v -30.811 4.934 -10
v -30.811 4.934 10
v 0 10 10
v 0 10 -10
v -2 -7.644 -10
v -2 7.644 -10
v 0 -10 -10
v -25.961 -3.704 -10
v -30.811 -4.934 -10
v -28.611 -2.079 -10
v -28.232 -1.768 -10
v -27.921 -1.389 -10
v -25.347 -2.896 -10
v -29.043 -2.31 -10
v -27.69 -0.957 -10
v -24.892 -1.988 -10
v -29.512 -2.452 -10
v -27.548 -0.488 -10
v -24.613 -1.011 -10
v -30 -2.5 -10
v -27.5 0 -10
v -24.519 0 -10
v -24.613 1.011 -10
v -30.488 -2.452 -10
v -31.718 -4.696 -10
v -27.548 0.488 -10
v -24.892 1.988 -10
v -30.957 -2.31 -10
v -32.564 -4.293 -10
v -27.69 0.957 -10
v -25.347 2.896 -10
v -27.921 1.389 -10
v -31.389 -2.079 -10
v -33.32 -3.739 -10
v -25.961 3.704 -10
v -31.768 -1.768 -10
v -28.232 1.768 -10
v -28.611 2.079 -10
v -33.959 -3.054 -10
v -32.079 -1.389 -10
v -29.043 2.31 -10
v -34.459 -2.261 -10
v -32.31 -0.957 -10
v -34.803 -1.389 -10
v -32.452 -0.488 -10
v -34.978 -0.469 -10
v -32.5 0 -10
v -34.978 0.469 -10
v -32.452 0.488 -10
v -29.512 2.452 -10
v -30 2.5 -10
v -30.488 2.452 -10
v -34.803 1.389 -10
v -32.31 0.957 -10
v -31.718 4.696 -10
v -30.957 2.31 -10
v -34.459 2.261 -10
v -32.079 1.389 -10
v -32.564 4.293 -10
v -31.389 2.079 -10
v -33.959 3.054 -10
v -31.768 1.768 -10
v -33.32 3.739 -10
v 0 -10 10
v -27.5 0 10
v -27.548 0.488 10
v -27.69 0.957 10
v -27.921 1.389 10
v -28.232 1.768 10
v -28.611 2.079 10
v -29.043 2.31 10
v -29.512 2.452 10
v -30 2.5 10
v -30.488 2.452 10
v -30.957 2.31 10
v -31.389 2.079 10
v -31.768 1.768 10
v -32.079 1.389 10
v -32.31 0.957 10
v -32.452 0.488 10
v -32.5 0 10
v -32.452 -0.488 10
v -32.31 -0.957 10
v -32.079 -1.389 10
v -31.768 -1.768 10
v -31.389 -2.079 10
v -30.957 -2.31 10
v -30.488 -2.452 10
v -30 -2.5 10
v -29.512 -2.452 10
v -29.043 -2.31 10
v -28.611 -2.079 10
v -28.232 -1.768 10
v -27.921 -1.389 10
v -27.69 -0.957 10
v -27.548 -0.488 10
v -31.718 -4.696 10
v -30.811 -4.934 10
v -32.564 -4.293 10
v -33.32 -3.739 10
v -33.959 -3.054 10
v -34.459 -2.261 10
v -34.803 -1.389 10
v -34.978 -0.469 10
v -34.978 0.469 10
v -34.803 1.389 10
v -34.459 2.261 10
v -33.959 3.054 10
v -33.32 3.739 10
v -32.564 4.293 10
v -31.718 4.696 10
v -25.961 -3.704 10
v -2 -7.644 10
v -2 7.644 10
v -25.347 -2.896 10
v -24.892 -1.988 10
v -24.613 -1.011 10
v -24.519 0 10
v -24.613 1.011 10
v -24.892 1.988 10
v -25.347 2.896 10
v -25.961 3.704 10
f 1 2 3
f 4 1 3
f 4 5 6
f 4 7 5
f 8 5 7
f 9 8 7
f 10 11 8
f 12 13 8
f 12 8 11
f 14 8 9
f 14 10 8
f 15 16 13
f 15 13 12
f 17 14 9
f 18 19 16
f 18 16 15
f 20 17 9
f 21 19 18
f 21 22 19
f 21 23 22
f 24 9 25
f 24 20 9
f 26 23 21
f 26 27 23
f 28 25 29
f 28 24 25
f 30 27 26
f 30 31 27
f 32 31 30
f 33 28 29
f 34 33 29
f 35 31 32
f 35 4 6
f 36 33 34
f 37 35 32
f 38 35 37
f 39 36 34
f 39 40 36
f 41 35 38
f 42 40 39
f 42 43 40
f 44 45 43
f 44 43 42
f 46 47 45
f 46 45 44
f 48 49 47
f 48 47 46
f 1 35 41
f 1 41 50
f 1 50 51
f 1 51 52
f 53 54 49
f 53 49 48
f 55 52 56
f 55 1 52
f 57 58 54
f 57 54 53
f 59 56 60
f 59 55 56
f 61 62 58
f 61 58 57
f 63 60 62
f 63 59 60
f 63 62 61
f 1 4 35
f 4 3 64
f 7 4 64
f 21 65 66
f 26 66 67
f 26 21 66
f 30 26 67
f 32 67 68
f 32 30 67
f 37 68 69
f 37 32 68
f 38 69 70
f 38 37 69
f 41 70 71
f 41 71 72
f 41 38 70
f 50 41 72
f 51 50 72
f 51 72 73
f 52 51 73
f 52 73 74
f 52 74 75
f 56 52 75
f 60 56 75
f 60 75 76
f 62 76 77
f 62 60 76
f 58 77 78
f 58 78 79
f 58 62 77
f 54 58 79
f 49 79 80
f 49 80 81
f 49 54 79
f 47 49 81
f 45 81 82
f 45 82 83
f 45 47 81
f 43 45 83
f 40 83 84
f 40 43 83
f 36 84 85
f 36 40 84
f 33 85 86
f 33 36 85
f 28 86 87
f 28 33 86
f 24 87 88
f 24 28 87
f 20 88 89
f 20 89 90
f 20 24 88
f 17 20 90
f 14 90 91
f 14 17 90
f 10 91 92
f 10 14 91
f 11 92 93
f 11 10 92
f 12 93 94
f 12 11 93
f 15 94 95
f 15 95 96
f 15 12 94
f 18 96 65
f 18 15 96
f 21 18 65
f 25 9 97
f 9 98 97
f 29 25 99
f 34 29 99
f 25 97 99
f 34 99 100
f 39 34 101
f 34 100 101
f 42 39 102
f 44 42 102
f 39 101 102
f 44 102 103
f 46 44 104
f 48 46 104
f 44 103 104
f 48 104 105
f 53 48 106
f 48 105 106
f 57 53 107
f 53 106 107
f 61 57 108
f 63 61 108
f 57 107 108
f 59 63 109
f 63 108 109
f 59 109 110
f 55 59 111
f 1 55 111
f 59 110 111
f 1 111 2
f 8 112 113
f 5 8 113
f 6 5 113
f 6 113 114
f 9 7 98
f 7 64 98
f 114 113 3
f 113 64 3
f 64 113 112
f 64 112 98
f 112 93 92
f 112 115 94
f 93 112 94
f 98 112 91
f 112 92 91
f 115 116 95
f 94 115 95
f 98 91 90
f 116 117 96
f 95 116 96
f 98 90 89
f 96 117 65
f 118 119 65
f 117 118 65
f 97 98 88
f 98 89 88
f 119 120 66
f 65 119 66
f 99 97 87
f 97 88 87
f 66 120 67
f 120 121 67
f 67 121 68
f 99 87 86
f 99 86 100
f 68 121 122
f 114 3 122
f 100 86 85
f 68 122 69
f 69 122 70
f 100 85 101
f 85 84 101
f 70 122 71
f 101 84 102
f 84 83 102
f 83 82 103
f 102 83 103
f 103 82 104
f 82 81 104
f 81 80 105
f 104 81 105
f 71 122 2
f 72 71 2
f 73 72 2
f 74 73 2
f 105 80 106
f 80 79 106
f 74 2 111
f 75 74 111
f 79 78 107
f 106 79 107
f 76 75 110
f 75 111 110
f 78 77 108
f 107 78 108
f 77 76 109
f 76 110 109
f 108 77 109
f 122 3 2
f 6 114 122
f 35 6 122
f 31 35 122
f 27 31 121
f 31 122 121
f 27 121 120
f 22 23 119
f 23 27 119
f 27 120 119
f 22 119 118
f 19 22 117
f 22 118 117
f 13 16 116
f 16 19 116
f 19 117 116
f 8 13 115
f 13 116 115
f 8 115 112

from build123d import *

# Parameters (mm, degrees)
SKETCH_1_R          = 2.5
EXTRUDE_1_DEPTH     = 10
CUT_EXTRUDE_1_DEPTH = 42.533119315


with BuildPart() as part:
    # 草图1 → 凸台-拉伸1 (new, symmetric)
    with BuildSketch(Plane.XY):
        with BuildLine():
            Line((0, 10), (0, -10))
            Line((0, -10), (-30.8112495, -4.933748499))
            ThreePointArc((-30.8112495, -4.933748499), (-35, 0), (-30.8112495, 4.933748499))
            Line((-30.8112495, 4.933748499), (0, 10))
        make_face()
        with Locations((-30, 0)):
            Circle(SKETCH_1_R, mode=Mode.SUBTRACT)
    extrude(amount=EXTRUDE_1_DEPTH, both=True)

    # 草图2 → 切除-拉伸1 (cut, through all)
    with BuildSketch(Plane.XY.offset(10)):
        with BuildLine():
            Line((-25.960774055, -3.704449068), (-2, -7.644286286))
            Line((-2, -7.644286286), (-2, 7.644286286))
            Line((-2, 7.644286286), (-25.960774055, 3.704449068))
            ThreePointArc((-25.960774055, 3.704449068), (-24.519280236, 0), (-25.960774055, -3.704449068))
        make_face()
    extrude(amount=-CUT_EXTRUDE_1_DEPTH, mode=Mode.SUBTRACT)


solid = part.part
